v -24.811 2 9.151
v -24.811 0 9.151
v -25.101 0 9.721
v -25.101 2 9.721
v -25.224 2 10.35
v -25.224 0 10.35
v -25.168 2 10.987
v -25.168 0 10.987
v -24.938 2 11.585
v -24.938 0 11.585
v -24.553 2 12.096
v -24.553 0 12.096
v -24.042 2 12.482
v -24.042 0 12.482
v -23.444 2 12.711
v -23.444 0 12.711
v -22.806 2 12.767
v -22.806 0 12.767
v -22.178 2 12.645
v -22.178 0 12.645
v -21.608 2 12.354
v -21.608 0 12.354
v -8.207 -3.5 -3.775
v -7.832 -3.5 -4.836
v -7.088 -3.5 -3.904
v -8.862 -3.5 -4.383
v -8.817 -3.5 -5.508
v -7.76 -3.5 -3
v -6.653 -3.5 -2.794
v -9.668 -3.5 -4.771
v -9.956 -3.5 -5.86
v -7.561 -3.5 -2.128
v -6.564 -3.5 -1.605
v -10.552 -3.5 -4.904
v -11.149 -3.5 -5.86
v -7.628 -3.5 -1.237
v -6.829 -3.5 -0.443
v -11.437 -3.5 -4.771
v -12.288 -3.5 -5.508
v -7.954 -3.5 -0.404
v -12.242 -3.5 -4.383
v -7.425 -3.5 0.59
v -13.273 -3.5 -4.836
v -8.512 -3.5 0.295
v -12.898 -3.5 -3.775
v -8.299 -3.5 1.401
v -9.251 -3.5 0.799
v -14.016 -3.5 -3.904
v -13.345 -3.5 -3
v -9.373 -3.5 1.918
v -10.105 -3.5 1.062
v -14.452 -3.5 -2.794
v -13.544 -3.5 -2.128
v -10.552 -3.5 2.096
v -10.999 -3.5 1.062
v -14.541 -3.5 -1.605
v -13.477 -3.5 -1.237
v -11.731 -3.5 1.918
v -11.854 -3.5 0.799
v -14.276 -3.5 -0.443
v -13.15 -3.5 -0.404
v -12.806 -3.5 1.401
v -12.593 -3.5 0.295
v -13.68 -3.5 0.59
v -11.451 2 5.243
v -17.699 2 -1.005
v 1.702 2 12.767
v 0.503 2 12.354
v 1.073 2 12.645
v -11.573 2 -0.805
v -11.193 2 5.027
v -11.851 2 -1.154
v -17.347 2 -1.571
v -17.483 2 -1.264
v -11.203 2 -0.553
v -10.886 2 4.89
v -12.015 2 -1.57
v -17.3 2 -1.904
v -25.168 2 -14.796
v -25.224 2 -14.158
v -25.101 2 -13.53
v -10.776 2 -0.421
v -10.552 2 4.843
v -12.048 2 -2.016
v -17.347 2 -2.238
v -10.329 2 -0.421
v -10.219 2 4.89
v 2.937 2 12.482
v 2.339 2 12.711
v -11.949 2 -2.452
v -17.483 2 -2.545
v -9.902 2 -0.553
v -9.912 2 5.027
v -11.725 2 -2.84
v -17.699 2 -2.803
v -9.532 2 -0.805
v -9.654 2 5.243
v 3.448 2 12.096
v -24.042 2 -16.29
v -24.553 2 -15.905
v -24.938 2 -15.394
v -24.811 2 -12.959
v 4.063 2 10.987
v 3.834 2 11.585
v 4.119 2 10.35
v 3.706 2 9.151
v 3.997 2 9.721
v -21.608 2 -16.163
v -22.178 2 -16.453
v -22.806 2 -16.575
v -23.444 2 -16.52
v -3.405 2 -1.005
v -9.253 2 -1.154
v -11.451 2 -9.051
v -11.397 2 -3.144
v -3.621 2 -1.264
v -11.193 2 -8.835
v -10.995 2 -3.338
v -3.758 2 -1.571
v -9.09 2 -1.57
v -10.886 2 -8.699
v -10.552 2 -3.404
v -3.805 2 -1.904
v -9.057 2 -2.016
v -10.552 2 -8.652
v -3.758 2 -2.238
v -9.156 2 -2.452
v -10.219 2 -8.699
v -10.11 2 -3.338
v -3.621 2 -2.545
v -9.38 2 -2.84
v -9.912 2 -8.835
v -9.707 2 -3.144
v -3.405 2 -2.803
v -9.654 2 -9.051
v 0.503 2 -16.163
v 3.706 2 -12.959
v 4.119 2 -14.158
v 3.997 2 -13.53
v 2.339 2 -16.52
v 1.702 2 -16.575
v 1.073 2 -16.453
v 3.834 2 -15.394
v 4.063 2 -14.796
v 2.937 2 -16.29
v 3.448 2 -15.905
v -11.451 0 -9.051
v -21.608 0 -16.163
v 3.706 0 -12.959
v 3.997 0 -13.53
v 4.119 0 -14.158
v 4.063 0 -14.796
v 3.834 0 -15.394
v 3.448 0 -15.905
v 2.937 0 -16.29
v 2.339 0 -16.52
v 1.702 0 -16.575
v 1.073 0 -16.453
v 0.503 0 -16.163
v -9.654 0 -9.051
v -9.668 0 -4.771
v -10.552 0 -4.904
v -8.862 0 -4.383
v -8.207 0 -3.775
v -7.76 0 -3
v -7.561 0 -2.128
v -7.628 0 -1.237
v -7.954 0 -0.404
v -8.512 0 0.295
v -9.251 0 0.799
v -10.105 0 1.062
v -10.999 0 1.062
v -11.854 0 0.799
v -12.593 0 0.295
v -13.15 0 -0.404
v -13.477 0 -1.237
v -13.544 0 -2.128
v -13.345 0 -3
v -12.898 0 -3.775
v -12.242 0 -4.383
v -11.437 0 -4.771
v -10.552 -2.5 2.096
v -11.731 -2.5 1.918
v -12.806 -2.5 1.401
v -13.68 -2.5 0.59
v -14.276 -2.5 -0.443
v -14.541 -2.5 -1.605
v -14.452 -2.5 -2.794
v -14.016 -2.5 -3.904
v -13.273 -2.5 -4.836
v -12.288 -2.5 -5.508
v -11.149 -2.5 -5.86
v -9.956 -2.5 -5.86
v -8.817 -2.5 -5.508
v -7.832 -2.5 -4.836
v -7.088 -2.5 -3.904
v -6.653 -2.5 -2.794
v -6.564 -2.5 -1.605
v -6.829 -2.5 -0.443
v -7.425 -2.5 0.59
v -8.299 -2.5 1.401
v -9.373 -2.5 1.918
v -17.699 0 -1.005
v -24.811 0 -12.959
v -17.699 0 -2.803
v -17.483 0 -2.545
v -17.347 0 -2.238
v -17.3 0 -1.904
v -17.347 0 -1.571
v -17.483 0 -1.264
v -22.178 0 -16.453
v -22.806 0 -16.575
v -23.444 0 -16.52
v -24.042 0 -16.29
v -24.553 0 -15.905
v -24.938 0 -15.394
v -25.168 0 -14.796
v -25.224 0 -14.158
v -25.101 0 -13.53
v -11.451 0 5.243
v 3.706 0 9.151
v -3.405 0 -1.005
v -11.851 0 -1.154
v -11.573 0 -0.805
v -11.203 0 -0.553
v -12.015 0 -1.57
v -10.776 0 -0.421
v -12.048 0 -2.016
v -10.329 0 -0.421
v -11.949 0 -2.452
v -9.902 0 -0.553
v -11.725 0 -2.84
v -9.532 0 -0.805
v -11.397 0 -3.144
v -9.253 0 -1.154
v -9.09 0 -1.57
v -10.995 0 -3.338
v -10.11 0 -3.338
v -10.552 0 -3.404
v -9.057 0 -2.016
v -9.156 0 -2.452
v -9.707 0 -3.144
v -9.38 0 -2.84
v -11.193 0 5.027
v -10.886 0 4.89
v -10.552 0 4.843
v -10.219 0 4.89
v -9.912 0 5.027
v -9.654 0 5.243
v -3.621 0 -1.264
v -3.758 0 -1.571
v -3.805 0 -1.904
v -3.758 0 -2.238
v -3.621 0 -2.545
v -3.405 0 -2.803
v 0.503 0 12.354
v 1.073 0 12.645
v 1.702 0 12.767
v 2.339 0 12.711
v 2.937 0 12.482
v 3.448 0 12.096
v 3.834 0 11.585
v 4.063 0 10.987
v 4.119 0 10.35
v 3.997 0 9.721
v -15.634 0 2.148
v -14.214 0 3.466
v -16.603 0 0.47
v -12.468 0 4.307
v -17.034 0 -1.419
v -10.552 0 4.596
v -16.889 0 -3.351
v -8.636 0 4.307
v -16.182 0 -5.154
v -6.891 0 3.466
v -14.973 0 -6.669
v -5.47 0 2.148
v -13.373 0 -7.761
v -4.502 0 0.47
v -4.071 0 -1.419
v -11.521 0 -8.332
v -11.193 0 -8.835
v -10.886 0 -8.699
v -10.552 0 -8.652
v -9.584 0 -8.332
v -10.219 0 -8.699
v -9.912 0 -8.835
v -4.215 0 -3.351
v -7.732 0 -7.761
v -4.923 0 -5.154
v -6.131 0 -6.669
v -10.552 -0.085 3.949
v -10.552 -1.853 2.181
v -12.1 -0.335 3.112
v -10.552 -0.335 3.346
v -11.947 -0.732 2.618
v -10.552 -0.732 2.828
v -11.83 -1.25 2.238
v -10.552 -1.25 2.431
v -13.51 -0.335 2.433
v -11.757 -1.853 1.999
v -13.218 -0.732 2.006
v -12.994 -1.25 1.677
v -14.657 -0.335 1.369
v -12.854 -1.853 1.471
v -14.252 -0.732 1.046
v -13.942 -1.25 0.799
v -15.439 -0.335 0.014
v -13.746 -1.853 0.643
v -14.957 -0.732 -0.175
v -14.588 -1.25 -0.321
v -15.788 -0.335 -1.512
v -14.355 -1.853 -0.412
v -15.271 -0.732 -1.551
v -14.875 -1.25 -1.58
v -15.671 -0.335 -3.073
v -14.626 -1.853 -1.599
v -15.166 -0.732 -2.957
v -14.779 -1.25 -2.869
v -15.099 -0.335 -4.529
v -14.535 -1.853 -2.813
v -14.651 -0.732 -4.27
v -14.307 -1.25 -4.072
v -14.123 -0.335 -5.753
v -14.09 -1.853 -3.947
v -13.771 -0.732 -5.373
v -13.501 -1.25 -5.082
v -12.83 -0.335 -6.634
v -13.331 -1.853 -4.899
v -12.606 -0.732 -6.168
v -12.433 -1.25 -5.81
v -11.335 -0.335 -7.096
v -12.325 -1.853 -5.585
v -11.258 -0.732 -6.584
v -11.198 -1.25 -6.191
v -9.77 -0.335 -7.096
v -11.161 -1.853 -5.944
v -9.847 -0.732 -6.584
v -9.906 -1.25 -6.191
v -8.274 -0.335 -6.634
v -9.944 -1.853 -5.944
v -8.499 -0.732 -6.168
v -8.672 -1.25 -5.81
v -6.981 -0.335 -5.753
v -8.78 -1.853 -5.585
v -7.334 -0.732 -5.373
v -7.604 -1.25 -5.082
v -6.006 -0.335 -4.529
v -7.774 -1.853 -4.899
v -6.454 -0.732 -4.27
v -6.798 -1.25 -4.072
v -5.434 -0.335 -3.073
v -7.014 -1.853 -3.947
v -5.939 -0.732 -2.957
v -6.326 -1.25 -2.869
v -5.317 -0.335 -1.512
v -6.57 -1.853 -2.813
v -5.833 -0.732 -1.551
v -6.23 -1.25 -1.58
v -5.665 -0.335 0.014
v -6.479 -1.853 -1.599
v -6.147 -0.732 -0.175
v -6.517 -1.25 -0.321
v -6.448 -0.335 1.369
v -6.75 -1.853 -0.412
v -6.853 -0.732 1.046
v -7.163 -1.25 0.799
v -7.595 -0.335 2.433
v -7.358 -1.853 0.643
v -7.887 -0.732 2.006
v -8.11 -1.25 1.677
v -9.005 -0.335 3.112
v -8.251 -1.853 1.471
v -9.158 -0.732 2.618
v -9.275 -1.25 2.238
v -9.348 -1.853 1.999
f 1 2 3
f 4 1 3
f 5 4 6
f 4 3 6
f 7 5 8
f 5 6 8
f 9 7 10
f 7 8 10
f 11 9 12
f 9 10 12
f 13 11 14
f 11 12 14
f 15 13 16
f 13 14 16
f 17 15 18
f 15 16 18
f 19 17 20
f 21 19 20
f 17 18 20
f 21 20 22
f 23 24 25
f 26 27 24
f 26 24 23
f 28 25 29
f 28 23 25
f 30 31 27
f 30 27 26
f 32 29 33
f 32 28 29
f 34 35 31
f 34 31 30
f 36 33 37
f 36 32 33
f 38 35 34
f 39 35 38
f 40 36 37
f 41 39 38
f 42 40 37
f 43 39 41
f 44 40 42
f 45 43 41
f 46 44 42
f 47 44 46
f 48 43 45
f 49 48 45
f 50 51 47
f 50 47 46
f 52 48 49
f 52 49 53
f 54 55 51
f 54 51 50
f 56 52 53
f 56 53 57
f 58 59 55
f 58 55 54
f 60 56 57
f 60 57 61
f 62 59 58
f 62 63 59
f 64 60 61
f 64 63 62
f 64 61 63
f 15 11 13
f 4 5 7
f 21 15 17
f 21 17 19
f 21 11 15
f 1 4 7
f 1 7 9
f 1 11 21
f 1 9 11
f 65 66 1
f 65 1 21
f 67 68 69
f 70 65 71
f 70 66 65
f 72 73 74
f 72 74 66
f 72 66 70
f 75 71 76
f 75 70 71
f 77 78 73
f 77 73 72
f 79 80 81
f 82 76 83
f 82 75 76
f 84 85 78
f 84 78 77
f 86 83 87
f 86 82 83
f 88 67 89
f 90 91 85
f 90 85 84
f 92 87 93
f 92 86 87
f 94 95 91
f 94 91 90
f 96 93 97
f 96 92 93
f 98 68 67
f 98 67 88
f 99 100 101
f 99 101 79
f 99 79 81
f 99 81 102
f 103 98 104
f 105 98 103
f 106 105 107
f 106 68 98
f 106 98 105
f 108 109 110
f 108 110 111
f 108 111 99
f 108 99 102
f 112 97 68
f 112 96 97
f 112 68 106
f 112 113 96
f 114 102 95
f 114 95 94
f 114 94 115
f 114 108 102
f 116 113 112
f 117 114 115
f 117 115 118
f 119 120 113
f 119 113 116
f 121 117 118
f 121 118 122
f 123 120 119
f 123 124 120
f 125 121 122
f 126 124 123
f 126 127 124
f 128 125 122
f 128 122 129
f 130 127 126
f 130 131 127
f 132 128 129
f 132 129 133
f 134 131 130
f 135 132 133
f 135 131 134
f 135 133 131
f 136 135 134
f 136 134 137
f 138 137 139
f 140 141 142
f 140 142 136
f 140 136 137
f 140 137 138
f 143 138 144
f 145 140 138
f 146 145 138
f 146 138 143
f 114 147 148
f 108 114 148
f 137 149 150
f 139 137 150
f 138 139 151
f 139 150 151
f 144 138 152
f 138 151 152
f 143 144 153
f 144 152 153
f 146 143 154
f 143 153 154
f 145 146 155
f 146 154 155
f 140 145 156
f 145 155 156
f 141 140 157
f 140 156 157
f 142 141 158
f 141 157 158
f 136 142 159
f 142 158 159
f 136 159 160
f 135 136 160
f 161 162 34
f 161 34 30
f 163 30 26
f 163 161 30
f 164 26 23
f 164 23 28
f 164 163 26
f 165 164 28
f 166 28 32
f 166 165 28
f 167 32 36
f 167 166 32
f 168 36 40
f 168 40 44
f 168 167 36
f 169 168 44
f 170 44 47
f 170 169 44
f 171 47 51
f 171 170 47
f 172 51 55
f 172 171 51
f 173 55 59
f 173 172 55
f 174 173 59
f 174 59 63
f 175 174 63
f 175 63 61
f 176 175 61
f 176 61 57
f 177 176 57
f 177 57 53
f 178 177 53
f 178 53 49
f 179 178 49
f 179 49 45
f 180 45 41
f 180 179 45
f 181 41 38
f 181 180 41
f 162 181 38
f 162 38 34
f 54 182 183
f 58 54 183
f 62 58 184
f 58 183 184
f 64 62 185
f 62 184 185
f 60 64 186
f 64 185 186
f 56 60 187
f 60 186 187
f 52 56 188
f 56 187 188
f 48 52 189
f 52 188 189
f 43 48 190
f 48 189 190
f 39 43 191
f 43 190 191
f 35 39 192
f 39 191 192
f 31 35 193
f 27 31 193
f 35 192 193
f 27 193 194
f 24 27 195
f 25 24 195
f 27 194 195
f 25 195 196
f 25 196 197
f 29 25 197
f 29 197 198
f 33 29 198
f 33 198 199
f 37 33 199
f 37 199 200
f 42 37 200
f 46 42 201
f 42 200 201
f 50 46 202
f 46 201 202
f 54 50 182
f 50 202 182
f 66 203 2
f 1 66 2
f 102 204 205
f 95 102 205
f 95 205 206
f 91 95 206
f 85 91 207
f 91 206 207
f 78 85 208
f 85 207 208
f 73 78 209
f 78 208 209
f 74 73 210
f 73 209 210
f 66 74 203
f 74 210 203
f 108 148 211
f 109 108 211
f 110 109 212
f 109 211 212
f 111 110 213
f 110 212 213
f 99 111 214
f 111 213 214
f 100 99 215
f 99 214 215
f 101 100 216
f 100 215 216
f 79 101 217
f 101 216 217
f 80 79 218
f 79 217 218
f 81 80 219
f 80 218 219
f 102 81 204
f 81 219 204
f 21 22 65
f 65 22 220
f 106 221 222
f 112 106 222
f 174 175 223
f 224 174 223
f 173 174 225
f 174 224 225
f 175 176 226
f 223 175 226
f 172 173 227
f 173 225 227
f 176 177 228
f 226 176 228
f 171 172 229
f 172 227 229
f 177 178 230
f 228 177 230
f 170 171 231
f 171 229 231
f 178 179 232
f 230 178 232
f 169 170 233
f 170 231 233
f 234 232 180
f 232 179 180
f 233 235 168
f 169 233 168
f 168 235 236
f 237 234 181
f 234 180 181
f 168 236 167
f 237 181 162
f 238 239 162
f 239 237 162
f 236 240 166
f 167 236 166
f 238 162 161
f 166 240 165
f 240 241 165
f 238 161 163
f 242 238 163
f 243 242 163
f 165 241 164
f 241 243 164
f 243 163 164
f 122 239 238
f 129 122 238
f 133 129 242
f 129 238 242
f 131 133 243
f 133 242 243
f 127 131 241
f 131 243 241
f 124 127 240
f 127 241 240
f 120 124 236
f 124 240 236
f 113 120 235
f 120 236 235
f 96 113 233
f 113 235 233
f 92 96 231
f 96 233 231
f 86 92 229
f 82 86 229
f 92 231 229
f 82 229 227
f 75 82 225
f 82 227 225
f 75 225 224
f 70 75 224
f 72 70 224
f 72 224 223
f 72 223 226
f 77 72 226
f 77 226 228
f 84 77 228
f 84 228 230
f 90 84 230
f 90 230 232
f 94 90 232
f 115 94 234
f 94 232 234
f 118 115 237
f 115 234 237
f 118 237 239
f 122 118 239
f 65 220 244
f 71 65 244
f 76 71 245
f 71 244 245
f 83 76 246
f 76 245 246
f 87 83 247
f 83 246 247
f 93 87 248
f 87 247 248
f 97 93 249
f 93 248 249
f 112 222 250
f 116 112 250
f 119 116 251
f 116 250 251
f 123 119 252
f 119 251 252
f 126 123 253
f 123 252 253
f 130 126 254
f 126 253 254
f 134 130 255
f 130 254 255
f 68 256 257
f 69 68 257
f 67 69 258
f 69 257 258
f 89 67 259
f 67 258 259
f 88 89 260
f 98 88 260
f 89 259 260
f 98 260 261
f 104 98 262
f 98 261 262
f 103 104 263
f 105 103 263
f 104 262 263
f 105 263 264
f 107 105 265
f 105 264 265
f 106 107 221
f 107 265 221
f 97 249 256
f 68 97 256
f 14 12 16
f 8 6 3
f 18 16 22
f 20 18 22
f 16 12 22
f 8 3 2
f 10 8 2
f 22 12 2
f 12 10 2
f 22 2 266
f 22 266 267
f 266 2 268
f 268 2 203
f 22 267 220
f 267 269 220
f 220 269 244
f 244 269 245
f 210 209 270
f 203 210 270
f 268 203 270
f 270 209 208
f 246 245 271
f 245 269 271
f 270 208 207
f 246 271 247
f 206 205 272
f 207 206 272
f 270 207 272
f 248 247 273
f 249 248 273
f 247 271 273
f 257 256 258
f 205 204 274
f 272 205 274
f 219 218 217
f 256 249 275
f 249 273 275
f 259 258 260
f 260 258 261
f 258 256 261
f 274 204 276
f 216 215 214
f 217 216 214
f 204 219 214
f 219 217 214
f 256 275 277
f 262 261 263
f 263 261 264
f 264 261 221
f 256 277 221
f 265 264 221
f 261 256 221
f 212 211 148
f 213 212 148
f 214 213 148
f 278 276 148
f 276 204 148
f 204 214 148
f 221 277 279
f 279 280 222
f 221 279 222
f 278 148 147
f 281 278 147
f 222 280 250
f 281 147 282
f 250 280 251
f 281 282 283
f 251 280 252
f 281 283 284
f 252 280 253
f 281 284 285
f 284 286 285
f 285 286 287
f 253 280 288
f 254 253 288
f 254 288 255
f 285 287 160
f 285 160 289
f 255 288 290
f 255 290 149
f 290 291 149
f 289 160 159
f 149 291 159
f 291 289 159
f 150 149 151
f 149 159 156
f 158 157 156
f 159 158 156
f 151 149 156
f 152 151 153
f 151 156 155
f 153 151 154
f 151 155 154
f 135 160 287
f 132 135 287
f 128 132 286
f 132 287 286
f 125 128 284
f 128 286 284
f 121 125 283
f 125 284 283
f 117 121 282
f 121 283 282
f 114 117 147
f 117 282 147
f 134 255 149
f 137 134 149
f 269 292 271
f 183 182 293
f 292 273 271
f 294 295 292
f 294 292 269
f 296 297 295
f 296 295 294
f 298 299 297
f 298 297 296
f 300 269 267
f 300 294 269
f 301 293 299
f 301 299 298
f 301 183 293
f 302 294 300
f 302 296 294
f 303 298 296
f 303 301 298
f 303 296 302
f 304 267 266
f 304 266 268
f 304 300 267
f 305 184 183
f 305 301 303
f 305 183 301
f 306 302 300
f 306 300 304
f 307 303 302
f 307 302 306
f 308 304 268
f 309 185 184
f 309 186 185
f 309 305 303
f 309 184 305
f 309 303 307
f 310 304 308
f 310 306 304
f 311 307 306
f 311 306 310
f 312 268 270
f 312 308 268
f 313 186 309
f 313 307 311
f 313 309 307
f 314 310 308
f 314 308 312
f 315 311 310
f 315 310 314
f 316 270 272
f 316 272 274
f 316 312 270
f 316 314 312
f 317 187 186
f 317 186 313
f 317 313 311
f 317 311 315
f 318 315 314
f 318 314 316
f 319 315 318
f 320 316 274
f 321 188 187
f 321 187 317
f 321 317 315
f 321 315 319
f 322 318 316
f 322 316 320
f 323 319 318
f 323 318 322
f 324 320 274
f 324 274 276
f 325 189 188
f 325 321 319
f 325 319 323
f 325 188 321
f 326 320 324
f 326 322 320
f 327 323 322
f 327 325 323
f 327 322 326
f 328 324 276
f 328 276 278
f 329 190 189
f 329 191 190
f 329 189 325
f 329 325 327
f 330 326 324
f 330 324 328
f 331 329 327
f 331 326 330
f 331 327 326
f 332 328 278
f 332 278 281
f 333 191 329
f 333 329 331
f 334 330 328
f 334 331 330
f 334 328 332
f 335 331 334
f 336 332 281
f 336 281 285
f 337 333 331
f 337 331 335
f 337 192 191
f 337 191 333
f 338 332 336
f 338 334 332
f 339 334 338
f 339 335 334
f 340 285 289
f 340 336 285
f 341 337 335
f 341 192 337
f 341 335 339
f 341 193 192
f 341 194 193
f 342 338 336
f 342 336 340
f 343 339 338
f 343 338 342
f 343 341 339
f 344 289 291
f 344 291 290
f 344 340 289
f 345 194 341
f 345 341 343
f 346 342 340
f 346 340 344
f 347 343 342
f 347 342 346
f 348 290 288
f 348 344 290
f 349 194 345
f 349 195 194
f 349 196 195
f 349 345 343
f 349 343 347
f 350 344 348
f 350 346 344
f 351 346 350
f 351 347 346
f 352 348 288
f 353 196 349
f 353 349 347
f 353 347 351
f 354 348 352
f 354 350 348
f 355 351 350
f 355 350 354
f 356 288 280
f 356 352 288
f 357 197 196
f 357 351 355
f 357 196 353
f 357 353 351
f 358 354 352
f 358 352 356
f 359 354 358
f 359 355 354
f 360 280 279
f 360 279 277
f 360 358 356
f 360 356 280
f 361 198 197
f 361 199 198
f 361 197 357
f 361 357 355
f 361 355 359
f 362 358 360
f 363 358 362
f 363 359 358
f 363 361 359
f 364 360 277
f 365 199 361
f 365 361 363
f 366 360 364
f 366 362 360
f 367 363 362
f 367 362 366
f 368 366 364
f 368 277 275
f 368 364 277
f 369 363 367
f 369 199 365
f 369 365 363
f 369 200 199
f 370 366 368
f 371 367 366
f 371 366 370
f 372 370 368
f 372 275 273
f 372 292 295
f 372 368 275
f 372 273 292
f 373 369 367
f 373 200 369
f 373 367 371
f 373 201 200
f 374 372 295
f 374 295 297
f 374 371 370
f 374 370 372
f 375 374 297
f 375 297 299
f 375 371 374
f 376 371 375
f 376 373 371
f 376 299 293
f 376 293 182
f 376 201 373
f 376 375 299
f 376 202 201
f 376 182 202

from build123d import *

# Parameters (mm, degrees)
BOSS_EXTRUDE1_DEPTH = 2
SKETCH2_R           = 4
SKETCH2_R_2         = 3
BOSS_EXTRUDE2_DEPTH = 3.5
FILLET1_R           = 2.5
SKETCH3_R           = 1.5
CUT_EXTRUDE1_DEPTH  = 2


with BuildPart() as part:
    # Sketch1 → Boss-Extrude1 (new body)
    with BuildSketch(Plane(origin=(0, 0, 0), x_dir=(1, 0, 0), z_dir=(0, 1, 0))):
        with BuildLine():
            Line((-24.810790305, 12.959420841), (-17.699288905, 2.803144292))
            ThreePointArc((-17.699288905, 2.803144292), (-17.300062844, 1.904277974), (-17.699288905, 1.005411656))
            Line((-17.699288905, 1.005411656), (-24.810790305, -9.150864893))
            ThreePointArc((-24.810790305, -9.150864893), (-24.5530862, -12.096436293), (-21.6075148, -12.354140399))
            Line((-21.6075148, -12.354140399), (-11.45123825, -5.242638998))
            ThreePointArc((-11.45123825, -5.242638998), (-10.552371933, -4.843412937), (-9.653505615, -5.242638998))
            Line((-9.653505615, -5.242638998), (0.502770934, -12.354140399))
            ThreePointArc((0.502770934, -12.354140399), (3.448342335, -12.096436293), (3.70604644, -9.150864893))
            Line((3.70604644, -9.150864893), (-3.40545496, 1.005411656))
            ThreePointArc((-3.40545496, 1.005411656), (-3.804681022, 1.904277974), (-3.40545496, 2.803144292))
            Line((-3.40545496, 2.803144292), (3.70604644, 12.959420841))
            ThreePointArc((3.70604644, 12.959420841), (3.448342335, 15.904992242), (0.502770934, 16.162696347))
            Line((0.502770934, 16.162696347), (-9.653505615, 9.051194947))
            ThreePointArc((-9.653505615, 9.051194947), (-10.552371933, 8.651968885), (-11.45123825, 9.051194947))
            Line((-11.45123825, 9.051194947), (-21.6075148, 16.162696347))
            ThreePointArc((-21.6075148, 16.162696347), (-24.5530862, 15.904992242), (-24.810790305, 12.959420841))
        make_face()
    extrude(amount=BOSS_EXTRUDE1_DEPTH)

    # Sketch2 → Boss-Extrude2 (add)
    with BuildSketch(Plane.XZ):
        with Locations(Location((-10.552371933, -1.904277974, 0), (0, 0, 90))):
            Circle(SKETCH2_R)
        with Locations(Location((-10.552371933, -1.904277974, 0), (0, 0, 270))):
            Circle(SKETCH2_R_2, mode=Mode.SUBTRACT)
    extrude(amount=BOSS_EXTRUDE2_DEPTH)

    # Fillet1
    fillet1_edges = [part.edges().sort_by_distance(p)[0] for p in [
        (-10.552371933, 0, -5.904277974),
    ]]
    fillet(fillet1_edges, radius=FILLET1_R)

    # Sketch3 → Cut-Extrude1 (cut)
    with BuildSketch(Plane.XZ):
        with Locations(Location((-10.552371933, -1.904277974, 0), (0, 0, 270))):
            Circle(SKETCH3_R)
    extrude(amount=-CUT_EXTRUDE1_DEPTH, mode=Mode.SUBTRACT)


solid = part.part
